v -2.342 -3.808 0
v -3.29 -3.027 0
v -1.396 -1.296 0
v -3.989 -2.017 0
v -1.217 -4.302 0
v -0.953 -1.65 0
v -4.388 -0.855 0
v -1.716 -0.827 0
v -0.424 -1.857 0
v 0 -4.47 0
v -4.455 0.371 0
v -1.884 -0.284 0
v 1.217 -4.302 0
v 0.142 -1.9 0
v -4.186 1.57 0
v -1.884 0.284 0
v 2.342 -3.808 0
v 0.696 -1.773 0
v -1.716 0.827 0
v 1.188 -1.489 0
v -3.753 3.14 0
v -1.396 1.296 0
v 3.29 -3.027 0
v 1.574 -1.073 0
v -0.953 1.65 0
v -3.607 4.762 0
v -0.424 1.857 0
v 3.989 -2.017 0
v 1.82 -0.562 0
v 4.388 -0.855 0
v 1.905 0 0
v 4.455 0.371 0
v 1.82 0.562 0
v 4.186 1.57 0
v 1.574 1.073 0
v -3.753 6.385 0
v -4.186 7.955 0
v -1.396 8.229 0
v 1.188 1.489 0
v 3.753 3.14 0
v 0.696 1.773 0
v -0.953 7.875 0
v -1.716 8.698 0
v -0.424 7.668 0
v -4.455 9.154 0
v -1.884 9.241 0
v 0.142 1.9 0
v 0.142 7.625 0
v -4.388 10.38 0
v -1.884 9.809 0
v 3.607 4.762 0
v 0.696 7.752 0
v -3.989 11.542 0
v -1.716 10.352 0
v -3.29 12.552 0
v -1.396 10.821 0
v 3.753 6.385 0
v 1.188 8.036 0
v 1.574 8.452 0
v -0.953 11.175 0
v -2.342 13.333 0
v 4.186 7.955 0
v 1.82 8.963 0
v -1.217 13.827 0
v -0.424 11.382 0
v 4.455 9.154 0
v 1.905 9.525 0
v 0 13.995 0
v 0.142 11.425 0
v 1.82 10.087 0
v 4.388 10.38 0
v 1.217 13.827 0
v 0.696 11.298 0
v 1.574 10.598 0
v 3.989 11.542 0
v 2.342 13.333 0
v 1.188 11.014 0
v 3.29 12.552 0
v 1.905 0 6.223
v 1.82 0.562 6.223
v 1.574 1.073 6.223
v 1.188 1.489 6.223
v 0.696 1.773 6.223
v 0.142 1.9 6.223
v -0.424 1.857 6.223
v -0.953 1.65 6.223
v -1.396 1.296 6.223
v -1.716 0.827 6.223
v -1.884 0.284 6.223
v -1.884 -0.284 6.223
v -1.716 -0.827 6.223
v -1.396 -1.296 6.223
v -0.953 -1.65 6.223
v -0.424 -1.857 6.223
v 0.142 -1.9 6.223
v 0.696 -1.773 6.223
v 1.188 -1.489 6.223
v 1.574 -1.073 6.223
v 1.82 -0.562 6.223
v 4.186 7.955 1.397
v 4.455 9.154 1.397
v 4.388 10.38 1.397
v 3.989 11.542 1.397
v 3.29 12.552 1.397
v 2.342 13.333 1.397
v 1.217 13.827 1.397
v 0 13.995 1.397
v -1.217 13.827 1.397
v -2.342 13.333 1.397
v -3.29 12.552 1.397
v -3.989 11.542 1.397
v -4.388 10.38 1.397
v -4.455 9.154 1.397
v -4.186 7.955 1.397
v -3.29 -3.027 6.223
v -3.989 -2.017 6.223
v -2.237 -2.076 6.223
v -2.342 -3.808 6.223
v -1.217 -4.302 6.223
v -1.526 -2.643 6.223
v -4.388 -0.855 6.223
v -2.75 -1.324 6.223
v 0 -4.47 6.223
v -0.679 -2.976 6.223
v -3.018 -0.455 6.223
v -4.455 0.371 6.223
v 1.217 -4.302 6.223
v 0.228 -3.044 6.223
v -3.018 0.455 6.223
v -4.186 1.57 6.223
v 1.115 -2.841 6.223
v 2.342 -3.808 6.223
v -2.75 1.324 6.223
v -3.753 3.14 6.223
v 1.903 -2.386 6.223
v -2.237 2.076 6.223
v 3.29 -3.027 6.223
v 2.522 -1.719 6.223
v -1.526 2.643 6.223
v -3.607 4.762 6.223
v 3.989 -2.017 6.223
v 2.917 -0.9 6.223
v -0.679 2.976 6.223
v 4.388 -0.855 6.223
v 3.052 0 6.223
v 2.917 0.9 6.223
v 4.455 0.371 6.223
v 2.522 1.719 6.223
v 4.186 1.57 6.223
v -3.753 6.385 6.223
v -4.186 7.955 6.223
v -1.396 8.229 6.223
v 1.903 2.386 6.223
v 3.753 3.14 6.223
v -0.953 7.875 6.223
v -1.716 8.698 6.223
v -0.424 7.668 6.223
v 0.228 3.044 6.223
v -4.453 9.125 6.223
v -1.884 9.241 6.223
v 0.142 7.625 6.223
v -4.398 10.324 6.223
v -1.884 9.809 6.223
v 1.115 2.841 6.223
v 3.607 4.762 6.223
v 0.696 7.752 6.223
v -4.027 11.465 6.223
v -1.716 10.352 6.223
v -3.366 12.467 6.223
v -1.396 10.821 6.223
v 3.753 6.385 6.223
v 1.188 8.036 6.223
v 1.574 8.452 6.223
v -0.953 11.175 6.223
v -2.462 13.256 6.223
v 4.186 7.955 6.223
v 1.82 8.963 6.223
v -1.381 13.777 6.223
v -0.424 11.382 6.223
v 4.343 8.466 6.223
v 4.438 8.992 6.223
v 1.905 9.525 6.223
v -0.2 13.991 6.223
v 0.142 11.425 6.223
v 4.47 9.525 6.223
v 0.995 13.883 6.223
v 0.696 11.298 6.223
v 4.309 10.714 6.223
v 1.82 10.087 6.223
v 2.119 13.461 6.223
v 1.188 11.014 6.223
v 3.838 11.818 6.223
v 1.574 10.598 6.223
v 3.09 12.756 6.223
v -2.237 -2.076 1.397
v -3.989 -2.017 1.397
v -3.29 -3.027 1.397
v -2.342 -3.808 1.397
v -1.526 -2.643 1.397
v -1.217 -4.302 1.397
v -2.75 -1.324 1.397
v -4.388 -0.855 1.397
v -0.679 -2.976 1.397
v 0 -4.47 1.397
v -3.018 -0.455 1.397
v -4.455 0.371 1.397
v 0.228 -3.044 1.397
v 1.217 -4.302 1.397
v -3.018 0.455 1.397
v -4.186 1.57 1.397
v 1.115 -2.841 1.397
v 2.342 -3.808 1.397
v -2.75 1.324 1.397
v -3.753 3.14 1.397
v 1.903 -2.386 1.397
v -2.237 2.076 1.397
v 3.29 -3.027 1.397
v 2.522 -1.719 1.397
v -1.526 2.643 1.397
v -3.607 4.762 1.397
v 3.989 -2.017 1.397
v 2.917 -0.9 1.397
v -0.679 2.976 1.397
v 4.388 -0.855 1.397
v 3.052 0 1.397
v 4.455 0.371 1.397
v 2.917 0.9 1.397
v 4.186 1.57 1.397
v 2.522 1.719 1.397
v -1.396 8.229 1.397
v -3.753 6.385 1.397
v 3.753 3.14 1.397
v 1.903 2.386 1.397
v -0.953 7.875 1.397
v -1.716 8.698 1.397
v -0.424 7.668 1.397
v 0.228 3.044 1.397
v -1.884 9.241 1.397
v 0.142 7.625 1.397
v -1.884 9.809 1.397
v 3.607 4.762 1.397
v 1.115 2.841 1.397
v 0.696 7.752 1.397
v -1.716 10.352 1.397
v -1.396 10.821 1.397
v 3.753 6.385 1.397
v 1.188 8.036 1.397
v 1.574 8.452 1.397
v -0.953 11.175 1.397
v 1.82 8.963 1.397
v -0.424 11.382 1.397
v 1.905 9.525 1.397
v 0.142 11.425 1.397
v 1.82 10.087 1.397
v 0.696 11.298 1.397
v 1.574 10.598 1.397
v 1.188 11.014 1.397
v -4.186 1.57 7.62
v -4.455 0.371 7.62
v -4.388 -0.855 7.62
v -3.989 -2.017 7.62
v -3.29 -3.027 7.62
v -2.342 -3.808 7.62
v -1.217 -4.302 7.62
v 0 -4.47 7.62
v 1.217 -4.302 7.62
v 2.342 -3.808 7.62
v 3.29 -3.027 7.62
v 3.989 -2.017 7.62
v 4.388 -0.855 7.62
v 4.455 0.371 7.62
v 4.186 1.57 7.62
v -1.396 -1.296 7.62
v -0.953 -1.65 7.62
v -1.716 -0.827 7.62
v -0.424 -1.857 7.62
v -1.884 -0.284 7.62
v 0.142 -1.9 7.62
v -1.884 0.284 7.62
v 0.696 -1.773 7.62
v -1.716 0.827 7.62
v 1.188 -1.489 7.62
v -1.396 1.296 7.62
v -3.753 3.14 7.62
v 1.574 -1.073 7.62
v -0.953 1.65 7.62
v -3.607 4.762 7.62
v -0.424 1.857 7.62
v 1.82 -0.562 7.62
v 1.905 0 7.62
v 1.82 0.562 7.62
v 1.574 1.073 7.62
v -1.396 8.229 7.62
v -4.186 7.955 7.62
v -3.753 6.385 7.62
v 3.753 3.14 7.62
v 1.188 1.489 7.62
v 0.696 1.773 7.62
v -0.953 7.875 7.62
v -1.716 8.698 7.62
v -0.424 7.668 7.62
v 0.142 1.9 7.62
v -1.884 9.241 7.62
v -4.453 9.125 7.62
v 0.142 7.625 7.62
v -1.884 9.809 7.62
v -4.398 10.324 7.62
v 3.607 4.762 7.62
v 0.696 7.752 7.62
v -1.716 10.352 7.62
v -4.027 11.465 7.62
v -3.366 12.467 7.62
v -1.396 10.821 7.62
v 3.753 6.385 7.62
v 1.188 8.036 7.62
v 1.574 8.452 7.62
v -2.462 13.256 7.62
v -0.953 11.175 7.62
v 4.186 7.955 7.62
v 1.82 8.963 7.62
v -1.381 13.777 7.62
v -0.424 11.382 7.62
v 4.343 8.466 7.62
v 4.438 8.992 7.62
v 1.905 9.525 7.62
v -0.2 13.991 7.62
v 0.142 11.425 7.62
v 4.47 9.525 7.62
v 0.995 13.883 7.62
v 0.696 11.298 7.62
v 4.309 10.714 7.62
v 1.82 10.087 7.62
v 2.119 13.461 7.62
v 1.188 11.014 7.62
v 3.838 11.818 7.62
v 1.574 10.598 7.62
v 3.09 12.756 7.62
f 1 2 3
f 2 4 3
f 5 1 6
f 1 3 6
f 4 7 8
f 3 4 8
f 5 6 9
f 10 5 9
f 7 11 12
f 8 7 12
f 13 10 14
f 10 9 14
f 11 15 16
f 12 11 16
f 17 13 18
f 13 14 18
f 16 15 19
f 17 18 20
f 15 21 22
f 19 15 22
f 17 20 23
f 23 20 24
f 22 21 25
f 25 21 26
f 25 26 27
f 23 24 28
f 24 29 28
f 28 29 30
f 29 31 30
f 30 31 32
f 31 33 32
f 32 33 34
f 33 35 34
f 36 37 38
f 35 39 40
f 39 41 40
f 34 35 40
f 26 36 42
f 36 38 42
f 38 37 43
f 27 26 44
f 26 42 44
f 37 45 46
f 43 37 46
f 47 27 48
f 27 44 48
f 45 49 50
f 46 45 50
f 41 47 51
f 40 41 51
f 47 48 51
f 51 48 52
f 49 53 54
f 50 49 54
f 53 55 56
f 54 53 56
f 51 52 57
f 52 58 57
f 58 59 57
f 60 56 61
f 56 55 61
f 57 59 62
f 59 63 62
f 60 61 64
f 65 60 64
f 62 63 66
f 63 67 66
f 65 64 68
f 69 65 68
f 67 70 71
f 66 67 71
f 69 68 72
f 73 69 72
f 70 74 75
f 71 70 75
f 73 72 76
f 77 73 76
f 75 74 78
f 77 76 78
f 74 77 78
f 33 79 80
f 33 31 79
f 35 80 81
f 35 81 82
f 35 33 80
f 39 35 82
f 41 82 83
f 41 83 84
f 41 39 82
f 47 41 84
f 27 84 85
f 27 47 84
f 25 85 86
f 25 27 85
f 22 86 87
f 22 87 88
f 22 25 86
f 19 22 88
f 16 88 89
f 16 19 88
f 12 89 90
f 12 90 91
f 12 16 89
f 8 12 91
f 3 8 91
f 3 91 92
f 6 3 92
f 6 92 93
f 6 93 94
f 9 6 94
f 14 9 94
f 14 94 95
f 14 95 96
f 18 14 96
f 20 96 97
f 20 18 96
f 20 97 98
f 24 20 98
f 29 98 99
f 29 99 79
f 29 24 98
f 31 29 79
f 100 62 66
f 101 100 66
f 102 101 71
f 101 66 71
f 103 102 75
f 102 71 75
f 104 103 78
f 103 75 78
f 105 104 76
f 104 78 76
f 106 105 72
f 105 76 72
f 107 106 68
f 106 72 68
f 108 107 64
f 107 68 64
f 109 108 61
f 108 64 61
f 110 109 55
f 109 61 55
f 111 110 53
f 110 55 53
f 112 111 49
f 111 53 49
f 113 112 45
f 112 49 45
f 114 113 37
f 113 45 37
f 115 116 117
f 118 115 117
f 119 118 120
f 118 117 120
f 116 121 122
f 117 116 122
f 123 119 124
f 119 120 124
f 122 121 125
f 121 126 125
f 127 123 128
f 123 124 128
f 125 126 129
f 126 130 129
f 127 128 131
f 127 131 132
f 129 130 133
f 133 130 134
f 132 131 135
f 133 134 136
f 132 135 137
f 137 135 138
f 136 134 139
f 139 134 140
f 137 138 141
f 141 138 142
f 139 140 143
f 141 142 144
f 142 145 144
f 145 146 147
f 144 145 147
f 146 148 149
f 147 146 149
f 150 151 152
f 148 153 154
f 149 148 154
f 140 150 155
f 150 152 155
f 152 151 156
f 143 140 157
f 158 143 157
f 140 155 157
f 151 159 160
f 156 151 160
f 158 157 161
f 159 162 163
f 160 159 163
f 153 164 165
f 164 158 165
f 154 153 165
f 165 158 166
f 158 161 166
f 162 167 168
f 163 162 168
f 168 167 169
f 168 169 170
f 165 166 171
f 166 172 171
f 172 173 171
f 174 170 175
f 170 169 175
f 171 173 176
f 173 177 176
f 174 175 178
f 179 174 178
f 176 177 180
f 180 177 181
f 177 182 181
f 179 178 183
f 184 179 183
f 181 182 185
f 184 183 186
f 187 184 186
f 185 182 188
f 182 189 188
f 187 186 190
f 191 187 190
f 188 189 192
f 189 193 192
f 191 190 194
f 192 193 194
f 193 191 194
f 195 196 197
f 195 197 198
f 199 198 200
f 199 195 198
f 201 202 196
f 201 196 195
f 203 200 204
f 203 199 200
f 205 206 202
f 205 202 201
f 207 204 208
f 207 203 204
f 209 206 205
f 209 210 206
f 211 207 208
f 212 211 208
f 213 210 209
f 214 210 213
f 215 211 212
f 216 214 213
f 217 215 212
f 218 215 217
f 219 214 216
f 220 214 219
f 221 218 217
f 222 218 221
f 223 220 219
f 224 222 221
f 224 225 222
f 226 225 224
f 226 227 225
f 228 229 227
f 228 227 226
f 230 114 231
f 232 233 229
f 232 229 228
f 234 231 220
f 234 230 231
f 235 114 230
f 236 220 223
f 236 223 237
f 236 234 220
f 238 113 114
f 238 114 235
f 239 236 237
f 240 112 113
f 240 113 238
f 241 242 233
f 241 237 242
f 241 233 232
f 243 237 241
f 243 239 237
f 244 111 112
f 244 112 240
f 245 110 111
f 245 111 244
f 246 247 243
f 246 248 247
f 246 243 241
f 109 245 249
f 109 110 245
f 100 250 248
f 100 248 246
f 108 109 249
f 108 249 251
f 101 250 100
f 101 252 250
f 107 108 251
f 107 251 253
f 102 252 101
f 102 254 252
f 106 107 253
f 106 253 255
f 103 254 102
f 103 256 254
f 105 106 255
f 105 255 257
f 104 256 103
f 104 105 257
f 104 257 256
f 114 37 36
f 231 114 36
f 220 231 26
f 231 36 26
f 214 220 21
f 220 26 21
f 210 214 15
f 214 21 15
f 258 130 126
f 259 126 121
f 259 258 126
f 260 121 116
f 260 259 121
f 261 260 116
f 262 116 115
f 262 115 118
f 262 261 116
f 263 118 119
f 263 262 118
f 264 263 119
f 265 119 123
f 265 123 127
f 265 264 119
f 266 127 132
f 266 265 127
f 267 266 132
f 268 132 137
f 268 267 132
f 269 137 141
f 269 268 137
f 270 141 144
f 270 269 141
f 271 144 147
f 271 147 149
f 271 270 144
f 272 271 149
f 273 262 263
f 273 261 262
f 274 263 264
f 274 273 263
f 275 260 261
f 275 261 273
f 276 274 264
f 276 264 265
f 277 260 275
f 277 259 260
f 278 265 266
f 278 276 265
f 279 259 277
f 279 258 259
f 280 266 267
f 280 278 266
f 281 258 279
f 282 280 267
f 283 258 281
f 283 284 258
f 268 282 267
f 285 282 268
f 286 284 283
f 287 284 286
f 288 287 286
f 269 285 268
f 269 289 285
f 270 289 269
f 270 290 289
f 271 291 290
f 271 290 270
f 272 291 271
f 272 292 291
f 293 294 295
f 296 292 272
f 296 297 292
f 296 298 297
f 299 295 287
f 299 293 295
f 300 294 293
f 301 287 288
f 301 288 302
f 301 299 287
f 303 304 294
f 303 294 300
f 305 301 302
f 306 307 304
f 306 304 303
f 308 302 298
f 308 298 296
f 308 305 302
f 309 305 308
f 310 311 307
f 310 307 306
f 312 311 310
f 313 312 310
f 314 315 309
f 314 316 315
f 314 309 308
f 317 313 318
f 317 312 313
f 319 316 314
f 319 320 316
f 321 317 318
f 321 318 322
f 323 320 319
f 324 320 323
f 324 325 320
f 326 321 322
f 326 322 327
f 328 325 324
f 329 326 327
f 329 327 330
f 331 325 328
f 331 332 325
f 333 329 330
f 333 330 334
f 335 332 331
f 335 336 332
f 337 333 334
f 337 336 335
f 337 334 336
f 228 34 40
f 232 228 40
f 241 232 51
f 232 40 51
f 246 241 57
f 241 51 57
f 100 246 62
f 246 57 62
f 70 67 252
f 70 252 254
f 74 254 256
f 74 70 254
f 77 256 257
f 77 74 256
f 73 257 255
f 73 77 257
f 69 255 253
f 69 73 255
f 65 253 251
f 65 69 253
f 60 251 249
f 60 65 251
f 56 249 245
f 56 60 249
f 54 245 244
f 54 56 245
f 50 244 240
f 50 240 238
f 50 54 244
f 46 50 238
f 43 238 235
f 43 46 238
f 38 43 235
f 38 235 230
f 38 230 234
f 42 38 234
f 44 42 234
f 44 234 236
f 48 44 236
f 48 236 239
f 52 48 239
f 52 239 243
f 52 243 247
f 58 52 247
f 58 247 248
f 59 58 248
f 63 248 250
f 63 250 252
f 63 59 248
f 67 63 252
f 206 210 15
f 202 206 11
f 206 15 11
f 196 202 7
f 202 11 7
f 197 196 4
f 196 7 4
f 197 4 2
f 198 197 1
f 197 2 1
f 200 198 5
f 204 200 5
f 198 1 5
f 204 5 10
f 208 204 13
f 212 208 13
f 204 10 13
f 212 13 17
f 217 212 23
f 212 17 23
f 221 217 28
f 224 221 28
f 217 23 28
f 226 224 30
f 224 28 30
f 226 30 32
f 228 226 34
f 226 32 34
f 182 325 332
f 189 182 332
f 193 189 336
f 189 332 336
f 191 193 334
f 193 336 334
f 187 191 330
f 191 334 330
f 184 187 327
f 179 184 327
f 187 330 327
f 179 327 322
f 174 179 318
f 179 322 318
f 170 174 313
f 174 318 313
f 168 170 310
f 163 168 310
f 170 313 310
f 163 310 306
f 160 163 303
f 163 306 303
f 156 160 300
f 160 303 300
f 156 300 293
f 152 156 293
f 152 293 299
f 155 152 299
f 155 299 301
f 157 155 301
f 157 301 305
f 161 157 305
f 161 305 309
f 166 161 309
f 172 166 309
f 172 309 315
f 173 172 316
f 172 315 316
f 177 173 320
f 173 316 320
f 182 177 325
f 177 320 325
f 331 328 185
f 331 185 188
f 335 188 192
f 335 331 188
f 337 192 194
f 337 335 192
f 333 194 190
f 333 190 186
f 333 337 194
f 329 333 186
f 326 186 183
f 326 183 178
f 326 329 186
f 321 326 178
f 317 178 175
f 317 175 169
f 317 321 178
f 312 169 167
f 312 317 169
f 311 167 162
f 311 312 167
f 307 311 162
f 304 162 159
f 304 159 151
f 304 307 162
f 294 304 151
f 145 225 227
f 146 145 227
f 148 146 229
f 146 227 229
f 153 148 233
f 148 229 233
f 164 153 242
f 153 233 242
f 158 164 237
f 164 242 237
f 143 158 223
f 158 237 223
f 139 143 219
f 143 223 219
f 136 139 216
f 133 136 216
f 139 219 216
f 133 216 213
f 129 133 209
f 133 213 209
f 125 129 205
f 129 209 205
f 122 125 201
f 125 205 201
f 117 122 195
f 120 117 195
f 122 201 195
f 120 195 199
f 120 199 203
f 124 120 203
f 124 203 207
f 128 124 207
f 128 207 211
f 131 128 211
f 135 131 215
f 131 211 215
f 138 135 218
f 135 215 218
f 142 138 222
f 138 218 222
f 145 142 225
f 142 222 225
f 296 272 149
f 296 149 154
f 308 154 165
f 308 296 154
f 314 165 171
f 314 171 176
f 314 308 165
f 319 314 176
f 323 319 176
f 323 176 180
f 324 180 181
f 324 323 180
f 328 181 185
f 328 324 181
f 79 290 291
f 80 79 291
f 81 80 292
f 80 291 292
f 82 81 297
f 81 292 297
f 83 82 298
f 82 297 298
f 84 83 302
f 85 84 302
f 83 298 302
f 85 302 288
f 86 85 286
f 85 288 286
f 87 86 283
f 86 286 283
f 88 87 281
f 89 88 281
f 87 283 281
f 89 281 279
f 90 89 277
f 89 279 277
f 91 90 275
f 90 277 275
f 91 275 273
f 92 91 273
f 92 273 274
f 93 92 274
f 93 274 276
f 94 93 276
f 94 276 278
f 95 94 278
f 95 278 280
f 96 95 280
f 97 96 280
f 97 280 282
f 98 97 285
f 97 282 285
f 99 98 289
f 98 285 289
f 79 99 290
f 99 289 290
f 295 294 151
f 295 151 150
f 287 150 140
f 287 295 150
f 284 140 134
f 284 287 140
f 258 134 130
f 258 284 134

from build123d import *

# Parameters (mm, degrees)
SKETCH2_R           = 4.4704
SKETCH2_R_2         = 1.905
BOSS_EXTRUDE1_DEPTH = 1.397
SKETCH3_R           = 3.052127004
SKETCH3_R_2         = 1.905
BOSS_EXTRUDE2_DEPTH = 4.826


with BuildPart() as part:
    # Sketch2 → Boss-Extrude1 (new body)
    # profile 1 of 3: a face of its own
    with BuildSketch(Plane.XY):
        Circle(SKETCH2_R)
        Circle(SKETCH2_R_2, mode=Mode.SUBTRACT)
    # profile 2 of 3: a face of its own
    with BuildSketch(Plane.XY):
        with BuildLine():
            ThreePointArc((-4.185765955, 1.569662233), (0, 4.4704), (4.185765955, 1.569662233))
            ThreePointArc((4.185765955, 1.569662233), (3.606794054, 4.7625), (4.185765955, 7.955337767))
            ThreePointArc((4.185765955, 7.955337767), (0, 5.0546), (-4.185765955, 7.955337767))
            ThreePointArc((-4.185765955, 7.955337767), (-3.606794054, 4.7625), (-4.185765955, 1.569662233))
        make_face()
    # profile 3 of 3: a face of its own
    with BuildSketch(Plane.XY):
        with Locations((0, 9.525)):
            Circle(SKETCH2_R)
        with Locations((0, 9.525)):
            Circle(SKETCH2_R_2, mode=Mode.SUBTRACT)
    boss_extrude1 = extrude(amount=BOSS_EXTRUDE1_DEPTH)

    # Sketch3 → Boss-Extrude2 (add)
    with BuildSketch(Plane.XY.offset(1.397)):
        Circle(SKETCH3_R)
        Circle(SKETCH3_R_2, mode=Mode.SUBTRACT)
    extrude(amount=BOSS_EXTRUDE2_DEPTH)

    # Mirror1: Boss-Extrude1 across plane
    add(boss_extrude1.mirror(Plane.XY.offset(3.81)))


solid = part.part
